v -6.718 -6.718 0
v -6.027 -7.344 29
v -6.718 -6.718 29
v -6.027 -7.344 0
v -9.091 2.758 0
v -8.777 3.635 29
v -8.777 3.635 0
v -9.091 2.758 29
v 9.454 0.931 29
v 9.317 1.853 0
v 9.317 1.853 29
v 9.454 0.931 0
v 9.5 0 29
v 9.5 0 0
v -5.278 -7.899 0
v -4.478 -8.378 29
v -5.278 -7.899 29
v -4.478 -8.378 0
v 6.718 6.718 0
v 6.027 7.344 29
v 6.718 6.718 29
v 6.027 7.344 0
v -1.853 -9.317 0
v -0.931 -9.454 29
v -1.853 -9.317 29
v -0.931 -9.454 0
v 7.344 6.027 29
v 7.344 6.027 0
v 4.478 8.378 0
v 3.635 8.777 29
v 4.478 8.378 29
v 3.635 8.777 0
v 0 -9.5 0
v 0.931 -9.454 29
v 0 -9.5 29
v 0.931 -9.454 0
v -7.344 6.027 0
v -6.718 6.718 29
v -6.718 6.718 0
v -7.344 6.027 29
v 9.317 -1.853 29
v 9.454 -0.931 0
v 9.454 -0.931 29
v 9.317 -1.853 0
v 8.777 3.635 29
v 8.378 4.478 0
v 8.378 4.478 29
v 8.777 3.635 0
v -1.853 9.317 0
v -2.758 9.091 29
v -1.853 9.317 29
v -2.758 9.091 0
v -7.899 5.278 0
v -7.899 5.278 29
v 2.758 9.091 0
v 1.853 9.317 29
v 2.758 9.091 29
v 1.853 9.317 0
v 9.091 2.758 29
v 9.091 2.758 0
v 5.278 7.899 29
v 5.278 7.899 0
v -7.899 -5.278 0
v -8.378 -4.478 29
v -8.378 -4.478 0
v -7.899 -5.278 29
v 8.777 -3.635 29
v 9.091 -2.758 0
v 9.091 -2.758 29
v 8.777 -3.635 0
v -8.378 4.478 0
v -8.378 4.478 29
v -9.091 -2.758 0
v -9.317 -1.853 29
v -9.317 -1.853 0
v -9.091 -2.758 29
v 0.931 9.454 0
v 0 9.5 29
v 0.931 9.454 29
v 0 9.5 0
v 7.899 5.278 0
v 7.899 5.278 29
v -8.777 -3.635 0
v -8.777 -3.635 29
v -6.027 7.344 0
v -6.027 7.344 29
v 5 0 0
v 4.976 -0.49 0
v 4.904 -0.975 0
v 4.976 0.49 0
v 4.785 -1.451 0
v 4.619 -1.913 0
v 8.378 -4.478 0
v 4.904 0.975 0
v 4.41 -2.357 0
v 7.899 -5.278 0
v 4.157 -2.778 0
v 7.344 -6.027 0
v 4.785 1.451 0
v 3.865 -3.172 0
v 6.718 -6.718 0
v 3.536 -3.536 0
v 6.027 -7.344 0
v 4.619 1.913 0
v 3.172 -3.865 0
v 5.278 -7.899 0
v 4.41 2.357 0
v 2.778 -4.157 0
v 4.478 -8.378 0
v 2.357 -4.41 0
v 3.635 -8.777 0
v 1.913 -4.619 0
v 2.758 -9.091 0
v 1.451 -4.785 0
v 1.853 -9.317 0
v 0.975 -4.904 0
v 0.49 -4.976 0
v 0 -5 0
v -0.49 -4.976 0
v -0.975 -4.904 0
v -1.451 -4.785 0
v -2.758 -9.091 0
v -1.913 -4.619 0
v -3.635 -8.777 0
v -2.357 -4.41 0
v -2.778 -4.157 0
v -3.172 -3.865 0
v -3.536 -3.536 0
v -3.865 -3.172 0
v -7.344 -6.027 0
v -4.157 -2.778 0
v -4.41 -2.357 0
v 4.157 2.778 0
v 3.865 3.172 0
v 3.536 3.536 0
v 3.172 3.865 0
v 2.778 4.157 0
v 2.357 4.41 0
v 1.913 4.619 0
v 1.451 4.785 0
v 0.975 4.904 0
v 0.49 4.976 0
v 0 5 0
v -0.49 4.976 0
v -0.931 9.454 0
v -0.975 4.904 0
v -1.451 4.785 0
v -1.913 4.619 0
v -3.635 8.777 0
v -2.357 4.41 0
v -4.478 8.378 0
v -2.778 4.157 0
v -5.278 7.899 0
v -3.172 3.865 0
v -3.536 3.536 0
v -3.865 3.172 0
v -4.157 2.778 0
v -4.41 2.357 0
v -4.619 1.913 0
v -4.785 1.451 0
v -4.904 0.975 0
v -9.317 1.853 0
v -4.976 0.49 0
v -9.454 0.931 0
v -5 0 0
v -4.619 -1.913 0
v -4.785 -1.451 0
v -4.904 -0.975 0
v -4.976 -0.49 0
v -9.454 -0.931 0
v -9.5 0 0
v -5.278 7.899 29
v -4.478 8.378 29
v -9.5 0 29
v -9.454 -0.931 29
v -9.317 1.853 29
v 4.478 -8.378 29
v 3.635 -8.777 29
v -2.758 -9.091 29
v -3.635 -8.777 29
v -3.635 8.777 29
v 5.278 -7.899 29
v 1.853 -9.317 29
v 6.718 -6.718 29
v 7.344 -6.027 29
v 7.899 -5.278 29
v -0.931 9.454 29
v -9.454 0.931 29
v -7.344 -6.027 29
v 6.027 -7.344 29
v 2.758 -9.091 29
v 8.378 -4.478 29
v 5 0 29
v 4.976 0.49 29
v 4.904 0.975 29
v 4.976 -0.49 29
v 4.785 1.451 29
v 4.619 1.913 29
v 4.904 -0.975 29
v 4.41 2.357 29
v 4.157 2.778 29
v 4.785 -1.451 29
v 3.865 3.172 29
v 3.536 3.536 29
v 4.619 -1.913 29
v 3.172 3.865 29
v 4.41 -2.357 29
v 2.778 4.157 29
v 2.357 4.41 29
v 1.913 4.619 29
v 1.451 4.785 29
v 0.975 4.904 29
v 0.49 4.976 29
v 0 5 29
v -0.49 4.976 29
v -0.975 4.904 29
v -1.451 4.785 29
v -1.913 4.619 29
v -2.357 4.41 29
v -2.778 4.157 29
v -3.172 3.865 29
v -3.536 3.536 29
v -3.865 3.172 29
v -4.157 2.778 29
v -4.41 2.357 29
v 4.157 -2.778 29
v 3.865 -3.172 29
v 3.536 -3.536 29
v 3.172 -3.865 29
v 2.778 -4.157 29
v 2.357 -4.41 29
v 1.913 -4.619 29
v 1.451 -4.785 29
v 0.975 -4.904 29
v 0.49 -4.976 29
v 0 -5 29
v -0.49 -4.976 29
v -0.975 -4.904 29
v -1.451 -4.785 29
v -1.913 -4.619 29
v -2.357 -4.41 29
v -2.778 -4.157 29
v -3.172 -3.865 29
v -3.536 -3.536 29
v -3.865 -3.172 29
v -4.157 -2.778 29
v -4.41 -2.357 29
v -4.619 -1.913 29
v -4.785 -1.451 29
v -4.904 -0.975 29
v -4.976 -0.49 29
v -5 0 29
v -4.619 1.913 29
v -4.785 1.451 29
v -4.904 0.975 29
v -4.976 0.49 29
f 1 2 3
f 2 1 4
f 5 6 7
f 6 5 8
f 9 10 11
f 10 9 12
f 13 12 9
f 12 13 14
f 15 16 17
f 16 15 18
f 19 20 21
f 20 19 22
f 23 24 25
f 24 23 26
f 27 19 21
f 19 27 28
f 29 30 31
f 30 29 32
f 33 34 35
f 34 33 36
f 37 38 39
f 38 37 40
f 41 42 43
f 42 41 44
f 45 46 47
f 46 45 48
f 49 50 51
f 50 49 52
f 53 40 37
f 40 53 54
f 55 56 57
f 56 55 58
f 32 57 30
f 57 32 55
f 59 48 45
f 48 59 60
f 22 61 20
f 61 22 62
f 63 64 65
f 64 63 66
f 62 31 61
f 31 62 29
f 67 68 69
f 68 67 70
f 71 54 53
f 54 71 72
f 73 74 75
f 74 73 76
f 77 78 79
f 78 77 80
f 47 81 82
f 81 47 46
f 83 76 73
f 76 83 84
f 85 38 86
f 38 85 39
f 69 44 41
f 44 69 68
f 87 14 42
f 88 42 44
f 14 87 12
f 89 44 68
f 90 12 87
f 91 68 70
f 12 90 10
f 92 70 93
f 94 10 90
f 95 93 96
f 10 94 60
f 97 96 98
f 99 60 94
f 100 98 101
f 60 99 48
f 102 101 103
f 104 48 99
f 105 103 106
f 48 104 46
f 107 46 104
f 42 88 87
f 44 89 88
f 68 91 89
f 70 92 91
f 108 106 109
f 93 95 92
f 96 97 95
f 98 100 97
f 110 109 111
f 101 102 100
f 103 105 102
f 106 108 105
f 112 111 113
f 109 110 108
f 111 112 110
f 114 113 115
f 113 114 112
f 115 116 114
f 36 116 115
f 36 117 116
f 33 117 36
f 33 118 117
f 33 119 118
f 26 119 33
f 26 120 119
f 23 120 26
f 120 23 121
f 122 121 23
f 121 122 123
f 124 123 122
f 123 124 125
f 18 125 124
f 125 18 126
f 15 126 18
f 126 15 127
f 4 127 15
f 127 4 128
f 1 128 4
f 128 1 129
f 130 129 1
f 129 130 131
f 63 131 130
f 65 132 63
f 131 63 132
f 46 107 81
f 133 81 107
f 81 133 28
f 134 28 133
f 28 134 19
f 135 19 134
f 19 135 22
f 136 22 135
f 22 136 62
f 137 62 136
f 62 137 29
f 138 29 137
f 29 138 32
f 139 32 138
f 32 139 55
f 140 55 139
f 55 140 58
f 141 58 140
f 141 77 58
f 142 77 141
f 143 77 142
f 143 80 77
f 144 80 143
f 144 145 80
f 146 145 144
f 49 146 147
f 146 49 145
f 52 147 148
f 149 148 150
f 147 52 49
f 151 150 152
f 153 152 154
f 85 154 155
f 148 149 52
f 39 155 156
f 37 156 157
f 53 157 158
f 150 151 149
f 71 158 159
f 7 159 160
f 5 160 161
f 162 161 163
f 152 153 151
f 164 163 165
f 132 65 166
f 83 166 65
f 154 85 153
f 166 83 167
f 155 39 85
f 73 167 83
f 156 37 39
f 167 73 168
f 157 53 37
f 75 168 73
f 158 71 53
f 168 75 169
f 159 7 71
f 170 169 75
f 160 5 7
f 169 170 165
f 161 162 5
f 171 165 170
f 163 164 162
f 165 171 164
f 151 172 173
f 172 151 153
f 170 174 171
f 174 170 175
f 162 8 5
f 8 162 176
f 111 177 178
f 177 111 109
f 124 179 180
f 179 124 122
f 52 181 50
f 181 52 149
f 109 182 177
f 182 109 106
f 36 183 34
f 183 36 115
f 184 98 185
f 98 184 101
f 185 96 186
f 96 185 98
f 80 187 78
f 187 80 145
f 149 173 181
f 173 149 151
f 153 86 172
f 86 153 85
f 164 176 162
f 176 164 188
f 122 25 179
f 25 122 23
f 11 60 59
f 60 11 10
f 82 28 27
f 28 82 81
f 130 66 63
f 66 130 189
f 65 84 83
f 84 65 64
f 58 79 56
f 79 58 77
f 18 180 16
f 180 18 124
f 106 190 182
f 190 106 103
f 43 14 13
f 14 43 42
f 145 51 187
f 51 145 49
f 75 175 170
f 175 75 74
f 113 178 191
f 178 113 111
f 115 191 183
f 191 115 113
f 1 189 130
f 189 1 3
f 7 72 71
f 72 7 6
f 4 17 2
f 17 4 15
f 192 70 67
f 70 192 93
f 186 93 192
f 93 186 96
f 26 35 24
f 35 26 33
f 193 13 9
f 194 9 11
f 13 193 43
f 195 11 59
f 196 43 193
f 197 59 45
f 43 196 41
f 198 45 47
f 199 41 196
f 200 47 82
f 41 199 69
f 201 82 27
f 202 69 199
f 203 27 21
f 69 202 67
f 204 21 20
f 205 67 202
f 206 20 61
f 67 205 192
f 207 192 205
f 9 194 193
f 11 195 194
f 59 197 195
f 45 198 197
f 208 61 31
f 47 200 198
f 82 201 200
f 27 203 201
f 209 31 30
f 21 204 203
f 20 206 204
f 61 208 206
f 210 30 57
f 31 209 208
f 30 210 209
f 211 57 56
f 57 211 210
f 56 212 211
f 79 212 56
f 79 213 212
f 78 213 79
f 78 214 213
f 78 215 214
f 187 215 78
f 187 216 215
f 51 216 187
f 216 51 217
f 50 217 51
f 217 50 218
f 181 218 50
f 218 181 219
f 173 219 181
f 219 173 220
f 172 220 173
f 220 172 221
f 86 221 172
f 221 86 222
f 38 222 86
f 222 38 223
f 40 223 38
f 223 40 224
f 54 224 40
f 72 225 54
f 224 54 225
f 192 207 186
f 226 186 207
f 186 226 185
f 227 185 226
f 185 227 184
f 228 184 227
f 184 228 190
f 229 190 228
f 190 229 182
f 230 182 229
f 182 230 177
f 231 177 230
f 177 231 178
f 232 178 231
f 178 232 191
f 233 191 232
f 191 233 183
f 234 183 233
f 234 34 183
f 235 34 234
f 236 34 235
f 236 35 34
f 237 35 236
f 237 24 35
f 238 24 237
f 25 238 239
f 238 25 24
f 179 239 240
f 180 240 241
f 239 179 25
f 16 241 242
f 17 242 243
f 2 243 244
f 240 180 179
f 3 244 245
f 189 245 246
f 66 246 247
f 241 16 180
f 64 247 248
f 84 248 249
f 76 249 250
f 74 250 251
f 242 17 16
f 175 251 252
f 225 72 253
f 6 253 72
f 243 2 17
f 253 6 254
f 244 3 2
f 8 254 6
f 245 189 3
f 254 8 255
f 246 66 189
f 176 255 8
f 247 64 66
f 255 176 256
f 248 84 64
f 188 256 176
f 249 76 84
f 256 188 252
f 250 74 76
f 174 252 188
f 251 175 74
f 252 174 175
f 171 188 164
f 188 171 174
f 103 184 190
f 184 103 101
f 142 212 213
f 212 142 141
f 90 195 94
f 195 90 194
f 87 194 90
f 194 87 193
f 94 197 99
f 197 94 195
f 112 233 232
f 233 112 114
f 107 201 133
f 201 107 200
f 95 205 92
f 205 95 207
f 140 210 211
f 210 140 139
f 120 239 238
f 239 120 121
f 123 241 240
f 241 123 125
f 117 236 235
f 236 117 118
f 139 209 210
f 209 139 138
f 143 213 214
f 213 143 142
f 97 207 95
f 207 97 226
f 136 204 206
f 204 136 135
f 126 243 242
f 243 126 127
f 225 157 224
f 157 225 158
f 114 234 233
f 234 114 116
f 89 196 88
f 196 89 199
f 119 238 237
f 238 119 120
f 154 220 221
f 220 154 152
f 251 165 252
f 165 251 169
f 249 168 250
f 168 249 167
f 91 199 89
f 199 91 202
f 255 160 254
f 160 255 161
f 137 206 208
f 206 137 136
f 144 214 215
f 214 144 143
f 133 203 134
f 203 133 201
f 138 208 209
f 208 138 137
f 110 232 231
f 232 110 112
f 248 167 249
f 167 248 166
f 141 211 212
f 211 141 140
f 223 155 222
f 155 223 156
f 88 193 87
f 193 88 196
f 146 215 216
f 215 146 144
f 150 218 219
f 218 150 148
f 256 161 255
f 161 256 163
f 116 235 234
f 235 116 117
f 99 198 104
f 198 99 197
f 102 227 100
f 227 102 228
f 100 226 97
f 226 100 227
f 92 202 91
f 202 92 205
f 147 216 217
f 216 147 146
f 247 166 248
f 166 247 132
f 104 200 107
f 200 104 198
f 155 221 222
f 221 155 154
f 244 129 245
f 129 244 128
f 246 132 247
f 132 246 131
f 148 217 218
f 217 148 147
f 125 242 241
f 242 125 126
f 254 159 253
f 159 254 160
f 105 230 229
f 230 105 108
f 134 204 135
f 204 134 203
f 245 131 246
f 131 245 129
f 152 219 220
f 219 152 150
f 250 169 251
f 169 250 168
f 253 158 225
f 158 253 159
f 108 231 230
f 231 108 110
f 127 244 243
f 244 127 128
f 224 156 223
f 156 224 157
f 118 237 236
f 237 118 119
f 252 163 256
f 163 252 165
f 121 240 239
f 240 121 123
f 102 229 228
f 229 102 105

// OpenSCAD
module linear_bearing() {
    difference() {
        // Outer cylinder
        cylinder(h=29.0, d=19.0, $fn=64);
        // Inner bore
        translate([0, 0, -1]) // Extend slightly to ensure clean cut
            cylinder(h=31.0, d=10.0, $fn=64);
    }
}

linear_bearing();
